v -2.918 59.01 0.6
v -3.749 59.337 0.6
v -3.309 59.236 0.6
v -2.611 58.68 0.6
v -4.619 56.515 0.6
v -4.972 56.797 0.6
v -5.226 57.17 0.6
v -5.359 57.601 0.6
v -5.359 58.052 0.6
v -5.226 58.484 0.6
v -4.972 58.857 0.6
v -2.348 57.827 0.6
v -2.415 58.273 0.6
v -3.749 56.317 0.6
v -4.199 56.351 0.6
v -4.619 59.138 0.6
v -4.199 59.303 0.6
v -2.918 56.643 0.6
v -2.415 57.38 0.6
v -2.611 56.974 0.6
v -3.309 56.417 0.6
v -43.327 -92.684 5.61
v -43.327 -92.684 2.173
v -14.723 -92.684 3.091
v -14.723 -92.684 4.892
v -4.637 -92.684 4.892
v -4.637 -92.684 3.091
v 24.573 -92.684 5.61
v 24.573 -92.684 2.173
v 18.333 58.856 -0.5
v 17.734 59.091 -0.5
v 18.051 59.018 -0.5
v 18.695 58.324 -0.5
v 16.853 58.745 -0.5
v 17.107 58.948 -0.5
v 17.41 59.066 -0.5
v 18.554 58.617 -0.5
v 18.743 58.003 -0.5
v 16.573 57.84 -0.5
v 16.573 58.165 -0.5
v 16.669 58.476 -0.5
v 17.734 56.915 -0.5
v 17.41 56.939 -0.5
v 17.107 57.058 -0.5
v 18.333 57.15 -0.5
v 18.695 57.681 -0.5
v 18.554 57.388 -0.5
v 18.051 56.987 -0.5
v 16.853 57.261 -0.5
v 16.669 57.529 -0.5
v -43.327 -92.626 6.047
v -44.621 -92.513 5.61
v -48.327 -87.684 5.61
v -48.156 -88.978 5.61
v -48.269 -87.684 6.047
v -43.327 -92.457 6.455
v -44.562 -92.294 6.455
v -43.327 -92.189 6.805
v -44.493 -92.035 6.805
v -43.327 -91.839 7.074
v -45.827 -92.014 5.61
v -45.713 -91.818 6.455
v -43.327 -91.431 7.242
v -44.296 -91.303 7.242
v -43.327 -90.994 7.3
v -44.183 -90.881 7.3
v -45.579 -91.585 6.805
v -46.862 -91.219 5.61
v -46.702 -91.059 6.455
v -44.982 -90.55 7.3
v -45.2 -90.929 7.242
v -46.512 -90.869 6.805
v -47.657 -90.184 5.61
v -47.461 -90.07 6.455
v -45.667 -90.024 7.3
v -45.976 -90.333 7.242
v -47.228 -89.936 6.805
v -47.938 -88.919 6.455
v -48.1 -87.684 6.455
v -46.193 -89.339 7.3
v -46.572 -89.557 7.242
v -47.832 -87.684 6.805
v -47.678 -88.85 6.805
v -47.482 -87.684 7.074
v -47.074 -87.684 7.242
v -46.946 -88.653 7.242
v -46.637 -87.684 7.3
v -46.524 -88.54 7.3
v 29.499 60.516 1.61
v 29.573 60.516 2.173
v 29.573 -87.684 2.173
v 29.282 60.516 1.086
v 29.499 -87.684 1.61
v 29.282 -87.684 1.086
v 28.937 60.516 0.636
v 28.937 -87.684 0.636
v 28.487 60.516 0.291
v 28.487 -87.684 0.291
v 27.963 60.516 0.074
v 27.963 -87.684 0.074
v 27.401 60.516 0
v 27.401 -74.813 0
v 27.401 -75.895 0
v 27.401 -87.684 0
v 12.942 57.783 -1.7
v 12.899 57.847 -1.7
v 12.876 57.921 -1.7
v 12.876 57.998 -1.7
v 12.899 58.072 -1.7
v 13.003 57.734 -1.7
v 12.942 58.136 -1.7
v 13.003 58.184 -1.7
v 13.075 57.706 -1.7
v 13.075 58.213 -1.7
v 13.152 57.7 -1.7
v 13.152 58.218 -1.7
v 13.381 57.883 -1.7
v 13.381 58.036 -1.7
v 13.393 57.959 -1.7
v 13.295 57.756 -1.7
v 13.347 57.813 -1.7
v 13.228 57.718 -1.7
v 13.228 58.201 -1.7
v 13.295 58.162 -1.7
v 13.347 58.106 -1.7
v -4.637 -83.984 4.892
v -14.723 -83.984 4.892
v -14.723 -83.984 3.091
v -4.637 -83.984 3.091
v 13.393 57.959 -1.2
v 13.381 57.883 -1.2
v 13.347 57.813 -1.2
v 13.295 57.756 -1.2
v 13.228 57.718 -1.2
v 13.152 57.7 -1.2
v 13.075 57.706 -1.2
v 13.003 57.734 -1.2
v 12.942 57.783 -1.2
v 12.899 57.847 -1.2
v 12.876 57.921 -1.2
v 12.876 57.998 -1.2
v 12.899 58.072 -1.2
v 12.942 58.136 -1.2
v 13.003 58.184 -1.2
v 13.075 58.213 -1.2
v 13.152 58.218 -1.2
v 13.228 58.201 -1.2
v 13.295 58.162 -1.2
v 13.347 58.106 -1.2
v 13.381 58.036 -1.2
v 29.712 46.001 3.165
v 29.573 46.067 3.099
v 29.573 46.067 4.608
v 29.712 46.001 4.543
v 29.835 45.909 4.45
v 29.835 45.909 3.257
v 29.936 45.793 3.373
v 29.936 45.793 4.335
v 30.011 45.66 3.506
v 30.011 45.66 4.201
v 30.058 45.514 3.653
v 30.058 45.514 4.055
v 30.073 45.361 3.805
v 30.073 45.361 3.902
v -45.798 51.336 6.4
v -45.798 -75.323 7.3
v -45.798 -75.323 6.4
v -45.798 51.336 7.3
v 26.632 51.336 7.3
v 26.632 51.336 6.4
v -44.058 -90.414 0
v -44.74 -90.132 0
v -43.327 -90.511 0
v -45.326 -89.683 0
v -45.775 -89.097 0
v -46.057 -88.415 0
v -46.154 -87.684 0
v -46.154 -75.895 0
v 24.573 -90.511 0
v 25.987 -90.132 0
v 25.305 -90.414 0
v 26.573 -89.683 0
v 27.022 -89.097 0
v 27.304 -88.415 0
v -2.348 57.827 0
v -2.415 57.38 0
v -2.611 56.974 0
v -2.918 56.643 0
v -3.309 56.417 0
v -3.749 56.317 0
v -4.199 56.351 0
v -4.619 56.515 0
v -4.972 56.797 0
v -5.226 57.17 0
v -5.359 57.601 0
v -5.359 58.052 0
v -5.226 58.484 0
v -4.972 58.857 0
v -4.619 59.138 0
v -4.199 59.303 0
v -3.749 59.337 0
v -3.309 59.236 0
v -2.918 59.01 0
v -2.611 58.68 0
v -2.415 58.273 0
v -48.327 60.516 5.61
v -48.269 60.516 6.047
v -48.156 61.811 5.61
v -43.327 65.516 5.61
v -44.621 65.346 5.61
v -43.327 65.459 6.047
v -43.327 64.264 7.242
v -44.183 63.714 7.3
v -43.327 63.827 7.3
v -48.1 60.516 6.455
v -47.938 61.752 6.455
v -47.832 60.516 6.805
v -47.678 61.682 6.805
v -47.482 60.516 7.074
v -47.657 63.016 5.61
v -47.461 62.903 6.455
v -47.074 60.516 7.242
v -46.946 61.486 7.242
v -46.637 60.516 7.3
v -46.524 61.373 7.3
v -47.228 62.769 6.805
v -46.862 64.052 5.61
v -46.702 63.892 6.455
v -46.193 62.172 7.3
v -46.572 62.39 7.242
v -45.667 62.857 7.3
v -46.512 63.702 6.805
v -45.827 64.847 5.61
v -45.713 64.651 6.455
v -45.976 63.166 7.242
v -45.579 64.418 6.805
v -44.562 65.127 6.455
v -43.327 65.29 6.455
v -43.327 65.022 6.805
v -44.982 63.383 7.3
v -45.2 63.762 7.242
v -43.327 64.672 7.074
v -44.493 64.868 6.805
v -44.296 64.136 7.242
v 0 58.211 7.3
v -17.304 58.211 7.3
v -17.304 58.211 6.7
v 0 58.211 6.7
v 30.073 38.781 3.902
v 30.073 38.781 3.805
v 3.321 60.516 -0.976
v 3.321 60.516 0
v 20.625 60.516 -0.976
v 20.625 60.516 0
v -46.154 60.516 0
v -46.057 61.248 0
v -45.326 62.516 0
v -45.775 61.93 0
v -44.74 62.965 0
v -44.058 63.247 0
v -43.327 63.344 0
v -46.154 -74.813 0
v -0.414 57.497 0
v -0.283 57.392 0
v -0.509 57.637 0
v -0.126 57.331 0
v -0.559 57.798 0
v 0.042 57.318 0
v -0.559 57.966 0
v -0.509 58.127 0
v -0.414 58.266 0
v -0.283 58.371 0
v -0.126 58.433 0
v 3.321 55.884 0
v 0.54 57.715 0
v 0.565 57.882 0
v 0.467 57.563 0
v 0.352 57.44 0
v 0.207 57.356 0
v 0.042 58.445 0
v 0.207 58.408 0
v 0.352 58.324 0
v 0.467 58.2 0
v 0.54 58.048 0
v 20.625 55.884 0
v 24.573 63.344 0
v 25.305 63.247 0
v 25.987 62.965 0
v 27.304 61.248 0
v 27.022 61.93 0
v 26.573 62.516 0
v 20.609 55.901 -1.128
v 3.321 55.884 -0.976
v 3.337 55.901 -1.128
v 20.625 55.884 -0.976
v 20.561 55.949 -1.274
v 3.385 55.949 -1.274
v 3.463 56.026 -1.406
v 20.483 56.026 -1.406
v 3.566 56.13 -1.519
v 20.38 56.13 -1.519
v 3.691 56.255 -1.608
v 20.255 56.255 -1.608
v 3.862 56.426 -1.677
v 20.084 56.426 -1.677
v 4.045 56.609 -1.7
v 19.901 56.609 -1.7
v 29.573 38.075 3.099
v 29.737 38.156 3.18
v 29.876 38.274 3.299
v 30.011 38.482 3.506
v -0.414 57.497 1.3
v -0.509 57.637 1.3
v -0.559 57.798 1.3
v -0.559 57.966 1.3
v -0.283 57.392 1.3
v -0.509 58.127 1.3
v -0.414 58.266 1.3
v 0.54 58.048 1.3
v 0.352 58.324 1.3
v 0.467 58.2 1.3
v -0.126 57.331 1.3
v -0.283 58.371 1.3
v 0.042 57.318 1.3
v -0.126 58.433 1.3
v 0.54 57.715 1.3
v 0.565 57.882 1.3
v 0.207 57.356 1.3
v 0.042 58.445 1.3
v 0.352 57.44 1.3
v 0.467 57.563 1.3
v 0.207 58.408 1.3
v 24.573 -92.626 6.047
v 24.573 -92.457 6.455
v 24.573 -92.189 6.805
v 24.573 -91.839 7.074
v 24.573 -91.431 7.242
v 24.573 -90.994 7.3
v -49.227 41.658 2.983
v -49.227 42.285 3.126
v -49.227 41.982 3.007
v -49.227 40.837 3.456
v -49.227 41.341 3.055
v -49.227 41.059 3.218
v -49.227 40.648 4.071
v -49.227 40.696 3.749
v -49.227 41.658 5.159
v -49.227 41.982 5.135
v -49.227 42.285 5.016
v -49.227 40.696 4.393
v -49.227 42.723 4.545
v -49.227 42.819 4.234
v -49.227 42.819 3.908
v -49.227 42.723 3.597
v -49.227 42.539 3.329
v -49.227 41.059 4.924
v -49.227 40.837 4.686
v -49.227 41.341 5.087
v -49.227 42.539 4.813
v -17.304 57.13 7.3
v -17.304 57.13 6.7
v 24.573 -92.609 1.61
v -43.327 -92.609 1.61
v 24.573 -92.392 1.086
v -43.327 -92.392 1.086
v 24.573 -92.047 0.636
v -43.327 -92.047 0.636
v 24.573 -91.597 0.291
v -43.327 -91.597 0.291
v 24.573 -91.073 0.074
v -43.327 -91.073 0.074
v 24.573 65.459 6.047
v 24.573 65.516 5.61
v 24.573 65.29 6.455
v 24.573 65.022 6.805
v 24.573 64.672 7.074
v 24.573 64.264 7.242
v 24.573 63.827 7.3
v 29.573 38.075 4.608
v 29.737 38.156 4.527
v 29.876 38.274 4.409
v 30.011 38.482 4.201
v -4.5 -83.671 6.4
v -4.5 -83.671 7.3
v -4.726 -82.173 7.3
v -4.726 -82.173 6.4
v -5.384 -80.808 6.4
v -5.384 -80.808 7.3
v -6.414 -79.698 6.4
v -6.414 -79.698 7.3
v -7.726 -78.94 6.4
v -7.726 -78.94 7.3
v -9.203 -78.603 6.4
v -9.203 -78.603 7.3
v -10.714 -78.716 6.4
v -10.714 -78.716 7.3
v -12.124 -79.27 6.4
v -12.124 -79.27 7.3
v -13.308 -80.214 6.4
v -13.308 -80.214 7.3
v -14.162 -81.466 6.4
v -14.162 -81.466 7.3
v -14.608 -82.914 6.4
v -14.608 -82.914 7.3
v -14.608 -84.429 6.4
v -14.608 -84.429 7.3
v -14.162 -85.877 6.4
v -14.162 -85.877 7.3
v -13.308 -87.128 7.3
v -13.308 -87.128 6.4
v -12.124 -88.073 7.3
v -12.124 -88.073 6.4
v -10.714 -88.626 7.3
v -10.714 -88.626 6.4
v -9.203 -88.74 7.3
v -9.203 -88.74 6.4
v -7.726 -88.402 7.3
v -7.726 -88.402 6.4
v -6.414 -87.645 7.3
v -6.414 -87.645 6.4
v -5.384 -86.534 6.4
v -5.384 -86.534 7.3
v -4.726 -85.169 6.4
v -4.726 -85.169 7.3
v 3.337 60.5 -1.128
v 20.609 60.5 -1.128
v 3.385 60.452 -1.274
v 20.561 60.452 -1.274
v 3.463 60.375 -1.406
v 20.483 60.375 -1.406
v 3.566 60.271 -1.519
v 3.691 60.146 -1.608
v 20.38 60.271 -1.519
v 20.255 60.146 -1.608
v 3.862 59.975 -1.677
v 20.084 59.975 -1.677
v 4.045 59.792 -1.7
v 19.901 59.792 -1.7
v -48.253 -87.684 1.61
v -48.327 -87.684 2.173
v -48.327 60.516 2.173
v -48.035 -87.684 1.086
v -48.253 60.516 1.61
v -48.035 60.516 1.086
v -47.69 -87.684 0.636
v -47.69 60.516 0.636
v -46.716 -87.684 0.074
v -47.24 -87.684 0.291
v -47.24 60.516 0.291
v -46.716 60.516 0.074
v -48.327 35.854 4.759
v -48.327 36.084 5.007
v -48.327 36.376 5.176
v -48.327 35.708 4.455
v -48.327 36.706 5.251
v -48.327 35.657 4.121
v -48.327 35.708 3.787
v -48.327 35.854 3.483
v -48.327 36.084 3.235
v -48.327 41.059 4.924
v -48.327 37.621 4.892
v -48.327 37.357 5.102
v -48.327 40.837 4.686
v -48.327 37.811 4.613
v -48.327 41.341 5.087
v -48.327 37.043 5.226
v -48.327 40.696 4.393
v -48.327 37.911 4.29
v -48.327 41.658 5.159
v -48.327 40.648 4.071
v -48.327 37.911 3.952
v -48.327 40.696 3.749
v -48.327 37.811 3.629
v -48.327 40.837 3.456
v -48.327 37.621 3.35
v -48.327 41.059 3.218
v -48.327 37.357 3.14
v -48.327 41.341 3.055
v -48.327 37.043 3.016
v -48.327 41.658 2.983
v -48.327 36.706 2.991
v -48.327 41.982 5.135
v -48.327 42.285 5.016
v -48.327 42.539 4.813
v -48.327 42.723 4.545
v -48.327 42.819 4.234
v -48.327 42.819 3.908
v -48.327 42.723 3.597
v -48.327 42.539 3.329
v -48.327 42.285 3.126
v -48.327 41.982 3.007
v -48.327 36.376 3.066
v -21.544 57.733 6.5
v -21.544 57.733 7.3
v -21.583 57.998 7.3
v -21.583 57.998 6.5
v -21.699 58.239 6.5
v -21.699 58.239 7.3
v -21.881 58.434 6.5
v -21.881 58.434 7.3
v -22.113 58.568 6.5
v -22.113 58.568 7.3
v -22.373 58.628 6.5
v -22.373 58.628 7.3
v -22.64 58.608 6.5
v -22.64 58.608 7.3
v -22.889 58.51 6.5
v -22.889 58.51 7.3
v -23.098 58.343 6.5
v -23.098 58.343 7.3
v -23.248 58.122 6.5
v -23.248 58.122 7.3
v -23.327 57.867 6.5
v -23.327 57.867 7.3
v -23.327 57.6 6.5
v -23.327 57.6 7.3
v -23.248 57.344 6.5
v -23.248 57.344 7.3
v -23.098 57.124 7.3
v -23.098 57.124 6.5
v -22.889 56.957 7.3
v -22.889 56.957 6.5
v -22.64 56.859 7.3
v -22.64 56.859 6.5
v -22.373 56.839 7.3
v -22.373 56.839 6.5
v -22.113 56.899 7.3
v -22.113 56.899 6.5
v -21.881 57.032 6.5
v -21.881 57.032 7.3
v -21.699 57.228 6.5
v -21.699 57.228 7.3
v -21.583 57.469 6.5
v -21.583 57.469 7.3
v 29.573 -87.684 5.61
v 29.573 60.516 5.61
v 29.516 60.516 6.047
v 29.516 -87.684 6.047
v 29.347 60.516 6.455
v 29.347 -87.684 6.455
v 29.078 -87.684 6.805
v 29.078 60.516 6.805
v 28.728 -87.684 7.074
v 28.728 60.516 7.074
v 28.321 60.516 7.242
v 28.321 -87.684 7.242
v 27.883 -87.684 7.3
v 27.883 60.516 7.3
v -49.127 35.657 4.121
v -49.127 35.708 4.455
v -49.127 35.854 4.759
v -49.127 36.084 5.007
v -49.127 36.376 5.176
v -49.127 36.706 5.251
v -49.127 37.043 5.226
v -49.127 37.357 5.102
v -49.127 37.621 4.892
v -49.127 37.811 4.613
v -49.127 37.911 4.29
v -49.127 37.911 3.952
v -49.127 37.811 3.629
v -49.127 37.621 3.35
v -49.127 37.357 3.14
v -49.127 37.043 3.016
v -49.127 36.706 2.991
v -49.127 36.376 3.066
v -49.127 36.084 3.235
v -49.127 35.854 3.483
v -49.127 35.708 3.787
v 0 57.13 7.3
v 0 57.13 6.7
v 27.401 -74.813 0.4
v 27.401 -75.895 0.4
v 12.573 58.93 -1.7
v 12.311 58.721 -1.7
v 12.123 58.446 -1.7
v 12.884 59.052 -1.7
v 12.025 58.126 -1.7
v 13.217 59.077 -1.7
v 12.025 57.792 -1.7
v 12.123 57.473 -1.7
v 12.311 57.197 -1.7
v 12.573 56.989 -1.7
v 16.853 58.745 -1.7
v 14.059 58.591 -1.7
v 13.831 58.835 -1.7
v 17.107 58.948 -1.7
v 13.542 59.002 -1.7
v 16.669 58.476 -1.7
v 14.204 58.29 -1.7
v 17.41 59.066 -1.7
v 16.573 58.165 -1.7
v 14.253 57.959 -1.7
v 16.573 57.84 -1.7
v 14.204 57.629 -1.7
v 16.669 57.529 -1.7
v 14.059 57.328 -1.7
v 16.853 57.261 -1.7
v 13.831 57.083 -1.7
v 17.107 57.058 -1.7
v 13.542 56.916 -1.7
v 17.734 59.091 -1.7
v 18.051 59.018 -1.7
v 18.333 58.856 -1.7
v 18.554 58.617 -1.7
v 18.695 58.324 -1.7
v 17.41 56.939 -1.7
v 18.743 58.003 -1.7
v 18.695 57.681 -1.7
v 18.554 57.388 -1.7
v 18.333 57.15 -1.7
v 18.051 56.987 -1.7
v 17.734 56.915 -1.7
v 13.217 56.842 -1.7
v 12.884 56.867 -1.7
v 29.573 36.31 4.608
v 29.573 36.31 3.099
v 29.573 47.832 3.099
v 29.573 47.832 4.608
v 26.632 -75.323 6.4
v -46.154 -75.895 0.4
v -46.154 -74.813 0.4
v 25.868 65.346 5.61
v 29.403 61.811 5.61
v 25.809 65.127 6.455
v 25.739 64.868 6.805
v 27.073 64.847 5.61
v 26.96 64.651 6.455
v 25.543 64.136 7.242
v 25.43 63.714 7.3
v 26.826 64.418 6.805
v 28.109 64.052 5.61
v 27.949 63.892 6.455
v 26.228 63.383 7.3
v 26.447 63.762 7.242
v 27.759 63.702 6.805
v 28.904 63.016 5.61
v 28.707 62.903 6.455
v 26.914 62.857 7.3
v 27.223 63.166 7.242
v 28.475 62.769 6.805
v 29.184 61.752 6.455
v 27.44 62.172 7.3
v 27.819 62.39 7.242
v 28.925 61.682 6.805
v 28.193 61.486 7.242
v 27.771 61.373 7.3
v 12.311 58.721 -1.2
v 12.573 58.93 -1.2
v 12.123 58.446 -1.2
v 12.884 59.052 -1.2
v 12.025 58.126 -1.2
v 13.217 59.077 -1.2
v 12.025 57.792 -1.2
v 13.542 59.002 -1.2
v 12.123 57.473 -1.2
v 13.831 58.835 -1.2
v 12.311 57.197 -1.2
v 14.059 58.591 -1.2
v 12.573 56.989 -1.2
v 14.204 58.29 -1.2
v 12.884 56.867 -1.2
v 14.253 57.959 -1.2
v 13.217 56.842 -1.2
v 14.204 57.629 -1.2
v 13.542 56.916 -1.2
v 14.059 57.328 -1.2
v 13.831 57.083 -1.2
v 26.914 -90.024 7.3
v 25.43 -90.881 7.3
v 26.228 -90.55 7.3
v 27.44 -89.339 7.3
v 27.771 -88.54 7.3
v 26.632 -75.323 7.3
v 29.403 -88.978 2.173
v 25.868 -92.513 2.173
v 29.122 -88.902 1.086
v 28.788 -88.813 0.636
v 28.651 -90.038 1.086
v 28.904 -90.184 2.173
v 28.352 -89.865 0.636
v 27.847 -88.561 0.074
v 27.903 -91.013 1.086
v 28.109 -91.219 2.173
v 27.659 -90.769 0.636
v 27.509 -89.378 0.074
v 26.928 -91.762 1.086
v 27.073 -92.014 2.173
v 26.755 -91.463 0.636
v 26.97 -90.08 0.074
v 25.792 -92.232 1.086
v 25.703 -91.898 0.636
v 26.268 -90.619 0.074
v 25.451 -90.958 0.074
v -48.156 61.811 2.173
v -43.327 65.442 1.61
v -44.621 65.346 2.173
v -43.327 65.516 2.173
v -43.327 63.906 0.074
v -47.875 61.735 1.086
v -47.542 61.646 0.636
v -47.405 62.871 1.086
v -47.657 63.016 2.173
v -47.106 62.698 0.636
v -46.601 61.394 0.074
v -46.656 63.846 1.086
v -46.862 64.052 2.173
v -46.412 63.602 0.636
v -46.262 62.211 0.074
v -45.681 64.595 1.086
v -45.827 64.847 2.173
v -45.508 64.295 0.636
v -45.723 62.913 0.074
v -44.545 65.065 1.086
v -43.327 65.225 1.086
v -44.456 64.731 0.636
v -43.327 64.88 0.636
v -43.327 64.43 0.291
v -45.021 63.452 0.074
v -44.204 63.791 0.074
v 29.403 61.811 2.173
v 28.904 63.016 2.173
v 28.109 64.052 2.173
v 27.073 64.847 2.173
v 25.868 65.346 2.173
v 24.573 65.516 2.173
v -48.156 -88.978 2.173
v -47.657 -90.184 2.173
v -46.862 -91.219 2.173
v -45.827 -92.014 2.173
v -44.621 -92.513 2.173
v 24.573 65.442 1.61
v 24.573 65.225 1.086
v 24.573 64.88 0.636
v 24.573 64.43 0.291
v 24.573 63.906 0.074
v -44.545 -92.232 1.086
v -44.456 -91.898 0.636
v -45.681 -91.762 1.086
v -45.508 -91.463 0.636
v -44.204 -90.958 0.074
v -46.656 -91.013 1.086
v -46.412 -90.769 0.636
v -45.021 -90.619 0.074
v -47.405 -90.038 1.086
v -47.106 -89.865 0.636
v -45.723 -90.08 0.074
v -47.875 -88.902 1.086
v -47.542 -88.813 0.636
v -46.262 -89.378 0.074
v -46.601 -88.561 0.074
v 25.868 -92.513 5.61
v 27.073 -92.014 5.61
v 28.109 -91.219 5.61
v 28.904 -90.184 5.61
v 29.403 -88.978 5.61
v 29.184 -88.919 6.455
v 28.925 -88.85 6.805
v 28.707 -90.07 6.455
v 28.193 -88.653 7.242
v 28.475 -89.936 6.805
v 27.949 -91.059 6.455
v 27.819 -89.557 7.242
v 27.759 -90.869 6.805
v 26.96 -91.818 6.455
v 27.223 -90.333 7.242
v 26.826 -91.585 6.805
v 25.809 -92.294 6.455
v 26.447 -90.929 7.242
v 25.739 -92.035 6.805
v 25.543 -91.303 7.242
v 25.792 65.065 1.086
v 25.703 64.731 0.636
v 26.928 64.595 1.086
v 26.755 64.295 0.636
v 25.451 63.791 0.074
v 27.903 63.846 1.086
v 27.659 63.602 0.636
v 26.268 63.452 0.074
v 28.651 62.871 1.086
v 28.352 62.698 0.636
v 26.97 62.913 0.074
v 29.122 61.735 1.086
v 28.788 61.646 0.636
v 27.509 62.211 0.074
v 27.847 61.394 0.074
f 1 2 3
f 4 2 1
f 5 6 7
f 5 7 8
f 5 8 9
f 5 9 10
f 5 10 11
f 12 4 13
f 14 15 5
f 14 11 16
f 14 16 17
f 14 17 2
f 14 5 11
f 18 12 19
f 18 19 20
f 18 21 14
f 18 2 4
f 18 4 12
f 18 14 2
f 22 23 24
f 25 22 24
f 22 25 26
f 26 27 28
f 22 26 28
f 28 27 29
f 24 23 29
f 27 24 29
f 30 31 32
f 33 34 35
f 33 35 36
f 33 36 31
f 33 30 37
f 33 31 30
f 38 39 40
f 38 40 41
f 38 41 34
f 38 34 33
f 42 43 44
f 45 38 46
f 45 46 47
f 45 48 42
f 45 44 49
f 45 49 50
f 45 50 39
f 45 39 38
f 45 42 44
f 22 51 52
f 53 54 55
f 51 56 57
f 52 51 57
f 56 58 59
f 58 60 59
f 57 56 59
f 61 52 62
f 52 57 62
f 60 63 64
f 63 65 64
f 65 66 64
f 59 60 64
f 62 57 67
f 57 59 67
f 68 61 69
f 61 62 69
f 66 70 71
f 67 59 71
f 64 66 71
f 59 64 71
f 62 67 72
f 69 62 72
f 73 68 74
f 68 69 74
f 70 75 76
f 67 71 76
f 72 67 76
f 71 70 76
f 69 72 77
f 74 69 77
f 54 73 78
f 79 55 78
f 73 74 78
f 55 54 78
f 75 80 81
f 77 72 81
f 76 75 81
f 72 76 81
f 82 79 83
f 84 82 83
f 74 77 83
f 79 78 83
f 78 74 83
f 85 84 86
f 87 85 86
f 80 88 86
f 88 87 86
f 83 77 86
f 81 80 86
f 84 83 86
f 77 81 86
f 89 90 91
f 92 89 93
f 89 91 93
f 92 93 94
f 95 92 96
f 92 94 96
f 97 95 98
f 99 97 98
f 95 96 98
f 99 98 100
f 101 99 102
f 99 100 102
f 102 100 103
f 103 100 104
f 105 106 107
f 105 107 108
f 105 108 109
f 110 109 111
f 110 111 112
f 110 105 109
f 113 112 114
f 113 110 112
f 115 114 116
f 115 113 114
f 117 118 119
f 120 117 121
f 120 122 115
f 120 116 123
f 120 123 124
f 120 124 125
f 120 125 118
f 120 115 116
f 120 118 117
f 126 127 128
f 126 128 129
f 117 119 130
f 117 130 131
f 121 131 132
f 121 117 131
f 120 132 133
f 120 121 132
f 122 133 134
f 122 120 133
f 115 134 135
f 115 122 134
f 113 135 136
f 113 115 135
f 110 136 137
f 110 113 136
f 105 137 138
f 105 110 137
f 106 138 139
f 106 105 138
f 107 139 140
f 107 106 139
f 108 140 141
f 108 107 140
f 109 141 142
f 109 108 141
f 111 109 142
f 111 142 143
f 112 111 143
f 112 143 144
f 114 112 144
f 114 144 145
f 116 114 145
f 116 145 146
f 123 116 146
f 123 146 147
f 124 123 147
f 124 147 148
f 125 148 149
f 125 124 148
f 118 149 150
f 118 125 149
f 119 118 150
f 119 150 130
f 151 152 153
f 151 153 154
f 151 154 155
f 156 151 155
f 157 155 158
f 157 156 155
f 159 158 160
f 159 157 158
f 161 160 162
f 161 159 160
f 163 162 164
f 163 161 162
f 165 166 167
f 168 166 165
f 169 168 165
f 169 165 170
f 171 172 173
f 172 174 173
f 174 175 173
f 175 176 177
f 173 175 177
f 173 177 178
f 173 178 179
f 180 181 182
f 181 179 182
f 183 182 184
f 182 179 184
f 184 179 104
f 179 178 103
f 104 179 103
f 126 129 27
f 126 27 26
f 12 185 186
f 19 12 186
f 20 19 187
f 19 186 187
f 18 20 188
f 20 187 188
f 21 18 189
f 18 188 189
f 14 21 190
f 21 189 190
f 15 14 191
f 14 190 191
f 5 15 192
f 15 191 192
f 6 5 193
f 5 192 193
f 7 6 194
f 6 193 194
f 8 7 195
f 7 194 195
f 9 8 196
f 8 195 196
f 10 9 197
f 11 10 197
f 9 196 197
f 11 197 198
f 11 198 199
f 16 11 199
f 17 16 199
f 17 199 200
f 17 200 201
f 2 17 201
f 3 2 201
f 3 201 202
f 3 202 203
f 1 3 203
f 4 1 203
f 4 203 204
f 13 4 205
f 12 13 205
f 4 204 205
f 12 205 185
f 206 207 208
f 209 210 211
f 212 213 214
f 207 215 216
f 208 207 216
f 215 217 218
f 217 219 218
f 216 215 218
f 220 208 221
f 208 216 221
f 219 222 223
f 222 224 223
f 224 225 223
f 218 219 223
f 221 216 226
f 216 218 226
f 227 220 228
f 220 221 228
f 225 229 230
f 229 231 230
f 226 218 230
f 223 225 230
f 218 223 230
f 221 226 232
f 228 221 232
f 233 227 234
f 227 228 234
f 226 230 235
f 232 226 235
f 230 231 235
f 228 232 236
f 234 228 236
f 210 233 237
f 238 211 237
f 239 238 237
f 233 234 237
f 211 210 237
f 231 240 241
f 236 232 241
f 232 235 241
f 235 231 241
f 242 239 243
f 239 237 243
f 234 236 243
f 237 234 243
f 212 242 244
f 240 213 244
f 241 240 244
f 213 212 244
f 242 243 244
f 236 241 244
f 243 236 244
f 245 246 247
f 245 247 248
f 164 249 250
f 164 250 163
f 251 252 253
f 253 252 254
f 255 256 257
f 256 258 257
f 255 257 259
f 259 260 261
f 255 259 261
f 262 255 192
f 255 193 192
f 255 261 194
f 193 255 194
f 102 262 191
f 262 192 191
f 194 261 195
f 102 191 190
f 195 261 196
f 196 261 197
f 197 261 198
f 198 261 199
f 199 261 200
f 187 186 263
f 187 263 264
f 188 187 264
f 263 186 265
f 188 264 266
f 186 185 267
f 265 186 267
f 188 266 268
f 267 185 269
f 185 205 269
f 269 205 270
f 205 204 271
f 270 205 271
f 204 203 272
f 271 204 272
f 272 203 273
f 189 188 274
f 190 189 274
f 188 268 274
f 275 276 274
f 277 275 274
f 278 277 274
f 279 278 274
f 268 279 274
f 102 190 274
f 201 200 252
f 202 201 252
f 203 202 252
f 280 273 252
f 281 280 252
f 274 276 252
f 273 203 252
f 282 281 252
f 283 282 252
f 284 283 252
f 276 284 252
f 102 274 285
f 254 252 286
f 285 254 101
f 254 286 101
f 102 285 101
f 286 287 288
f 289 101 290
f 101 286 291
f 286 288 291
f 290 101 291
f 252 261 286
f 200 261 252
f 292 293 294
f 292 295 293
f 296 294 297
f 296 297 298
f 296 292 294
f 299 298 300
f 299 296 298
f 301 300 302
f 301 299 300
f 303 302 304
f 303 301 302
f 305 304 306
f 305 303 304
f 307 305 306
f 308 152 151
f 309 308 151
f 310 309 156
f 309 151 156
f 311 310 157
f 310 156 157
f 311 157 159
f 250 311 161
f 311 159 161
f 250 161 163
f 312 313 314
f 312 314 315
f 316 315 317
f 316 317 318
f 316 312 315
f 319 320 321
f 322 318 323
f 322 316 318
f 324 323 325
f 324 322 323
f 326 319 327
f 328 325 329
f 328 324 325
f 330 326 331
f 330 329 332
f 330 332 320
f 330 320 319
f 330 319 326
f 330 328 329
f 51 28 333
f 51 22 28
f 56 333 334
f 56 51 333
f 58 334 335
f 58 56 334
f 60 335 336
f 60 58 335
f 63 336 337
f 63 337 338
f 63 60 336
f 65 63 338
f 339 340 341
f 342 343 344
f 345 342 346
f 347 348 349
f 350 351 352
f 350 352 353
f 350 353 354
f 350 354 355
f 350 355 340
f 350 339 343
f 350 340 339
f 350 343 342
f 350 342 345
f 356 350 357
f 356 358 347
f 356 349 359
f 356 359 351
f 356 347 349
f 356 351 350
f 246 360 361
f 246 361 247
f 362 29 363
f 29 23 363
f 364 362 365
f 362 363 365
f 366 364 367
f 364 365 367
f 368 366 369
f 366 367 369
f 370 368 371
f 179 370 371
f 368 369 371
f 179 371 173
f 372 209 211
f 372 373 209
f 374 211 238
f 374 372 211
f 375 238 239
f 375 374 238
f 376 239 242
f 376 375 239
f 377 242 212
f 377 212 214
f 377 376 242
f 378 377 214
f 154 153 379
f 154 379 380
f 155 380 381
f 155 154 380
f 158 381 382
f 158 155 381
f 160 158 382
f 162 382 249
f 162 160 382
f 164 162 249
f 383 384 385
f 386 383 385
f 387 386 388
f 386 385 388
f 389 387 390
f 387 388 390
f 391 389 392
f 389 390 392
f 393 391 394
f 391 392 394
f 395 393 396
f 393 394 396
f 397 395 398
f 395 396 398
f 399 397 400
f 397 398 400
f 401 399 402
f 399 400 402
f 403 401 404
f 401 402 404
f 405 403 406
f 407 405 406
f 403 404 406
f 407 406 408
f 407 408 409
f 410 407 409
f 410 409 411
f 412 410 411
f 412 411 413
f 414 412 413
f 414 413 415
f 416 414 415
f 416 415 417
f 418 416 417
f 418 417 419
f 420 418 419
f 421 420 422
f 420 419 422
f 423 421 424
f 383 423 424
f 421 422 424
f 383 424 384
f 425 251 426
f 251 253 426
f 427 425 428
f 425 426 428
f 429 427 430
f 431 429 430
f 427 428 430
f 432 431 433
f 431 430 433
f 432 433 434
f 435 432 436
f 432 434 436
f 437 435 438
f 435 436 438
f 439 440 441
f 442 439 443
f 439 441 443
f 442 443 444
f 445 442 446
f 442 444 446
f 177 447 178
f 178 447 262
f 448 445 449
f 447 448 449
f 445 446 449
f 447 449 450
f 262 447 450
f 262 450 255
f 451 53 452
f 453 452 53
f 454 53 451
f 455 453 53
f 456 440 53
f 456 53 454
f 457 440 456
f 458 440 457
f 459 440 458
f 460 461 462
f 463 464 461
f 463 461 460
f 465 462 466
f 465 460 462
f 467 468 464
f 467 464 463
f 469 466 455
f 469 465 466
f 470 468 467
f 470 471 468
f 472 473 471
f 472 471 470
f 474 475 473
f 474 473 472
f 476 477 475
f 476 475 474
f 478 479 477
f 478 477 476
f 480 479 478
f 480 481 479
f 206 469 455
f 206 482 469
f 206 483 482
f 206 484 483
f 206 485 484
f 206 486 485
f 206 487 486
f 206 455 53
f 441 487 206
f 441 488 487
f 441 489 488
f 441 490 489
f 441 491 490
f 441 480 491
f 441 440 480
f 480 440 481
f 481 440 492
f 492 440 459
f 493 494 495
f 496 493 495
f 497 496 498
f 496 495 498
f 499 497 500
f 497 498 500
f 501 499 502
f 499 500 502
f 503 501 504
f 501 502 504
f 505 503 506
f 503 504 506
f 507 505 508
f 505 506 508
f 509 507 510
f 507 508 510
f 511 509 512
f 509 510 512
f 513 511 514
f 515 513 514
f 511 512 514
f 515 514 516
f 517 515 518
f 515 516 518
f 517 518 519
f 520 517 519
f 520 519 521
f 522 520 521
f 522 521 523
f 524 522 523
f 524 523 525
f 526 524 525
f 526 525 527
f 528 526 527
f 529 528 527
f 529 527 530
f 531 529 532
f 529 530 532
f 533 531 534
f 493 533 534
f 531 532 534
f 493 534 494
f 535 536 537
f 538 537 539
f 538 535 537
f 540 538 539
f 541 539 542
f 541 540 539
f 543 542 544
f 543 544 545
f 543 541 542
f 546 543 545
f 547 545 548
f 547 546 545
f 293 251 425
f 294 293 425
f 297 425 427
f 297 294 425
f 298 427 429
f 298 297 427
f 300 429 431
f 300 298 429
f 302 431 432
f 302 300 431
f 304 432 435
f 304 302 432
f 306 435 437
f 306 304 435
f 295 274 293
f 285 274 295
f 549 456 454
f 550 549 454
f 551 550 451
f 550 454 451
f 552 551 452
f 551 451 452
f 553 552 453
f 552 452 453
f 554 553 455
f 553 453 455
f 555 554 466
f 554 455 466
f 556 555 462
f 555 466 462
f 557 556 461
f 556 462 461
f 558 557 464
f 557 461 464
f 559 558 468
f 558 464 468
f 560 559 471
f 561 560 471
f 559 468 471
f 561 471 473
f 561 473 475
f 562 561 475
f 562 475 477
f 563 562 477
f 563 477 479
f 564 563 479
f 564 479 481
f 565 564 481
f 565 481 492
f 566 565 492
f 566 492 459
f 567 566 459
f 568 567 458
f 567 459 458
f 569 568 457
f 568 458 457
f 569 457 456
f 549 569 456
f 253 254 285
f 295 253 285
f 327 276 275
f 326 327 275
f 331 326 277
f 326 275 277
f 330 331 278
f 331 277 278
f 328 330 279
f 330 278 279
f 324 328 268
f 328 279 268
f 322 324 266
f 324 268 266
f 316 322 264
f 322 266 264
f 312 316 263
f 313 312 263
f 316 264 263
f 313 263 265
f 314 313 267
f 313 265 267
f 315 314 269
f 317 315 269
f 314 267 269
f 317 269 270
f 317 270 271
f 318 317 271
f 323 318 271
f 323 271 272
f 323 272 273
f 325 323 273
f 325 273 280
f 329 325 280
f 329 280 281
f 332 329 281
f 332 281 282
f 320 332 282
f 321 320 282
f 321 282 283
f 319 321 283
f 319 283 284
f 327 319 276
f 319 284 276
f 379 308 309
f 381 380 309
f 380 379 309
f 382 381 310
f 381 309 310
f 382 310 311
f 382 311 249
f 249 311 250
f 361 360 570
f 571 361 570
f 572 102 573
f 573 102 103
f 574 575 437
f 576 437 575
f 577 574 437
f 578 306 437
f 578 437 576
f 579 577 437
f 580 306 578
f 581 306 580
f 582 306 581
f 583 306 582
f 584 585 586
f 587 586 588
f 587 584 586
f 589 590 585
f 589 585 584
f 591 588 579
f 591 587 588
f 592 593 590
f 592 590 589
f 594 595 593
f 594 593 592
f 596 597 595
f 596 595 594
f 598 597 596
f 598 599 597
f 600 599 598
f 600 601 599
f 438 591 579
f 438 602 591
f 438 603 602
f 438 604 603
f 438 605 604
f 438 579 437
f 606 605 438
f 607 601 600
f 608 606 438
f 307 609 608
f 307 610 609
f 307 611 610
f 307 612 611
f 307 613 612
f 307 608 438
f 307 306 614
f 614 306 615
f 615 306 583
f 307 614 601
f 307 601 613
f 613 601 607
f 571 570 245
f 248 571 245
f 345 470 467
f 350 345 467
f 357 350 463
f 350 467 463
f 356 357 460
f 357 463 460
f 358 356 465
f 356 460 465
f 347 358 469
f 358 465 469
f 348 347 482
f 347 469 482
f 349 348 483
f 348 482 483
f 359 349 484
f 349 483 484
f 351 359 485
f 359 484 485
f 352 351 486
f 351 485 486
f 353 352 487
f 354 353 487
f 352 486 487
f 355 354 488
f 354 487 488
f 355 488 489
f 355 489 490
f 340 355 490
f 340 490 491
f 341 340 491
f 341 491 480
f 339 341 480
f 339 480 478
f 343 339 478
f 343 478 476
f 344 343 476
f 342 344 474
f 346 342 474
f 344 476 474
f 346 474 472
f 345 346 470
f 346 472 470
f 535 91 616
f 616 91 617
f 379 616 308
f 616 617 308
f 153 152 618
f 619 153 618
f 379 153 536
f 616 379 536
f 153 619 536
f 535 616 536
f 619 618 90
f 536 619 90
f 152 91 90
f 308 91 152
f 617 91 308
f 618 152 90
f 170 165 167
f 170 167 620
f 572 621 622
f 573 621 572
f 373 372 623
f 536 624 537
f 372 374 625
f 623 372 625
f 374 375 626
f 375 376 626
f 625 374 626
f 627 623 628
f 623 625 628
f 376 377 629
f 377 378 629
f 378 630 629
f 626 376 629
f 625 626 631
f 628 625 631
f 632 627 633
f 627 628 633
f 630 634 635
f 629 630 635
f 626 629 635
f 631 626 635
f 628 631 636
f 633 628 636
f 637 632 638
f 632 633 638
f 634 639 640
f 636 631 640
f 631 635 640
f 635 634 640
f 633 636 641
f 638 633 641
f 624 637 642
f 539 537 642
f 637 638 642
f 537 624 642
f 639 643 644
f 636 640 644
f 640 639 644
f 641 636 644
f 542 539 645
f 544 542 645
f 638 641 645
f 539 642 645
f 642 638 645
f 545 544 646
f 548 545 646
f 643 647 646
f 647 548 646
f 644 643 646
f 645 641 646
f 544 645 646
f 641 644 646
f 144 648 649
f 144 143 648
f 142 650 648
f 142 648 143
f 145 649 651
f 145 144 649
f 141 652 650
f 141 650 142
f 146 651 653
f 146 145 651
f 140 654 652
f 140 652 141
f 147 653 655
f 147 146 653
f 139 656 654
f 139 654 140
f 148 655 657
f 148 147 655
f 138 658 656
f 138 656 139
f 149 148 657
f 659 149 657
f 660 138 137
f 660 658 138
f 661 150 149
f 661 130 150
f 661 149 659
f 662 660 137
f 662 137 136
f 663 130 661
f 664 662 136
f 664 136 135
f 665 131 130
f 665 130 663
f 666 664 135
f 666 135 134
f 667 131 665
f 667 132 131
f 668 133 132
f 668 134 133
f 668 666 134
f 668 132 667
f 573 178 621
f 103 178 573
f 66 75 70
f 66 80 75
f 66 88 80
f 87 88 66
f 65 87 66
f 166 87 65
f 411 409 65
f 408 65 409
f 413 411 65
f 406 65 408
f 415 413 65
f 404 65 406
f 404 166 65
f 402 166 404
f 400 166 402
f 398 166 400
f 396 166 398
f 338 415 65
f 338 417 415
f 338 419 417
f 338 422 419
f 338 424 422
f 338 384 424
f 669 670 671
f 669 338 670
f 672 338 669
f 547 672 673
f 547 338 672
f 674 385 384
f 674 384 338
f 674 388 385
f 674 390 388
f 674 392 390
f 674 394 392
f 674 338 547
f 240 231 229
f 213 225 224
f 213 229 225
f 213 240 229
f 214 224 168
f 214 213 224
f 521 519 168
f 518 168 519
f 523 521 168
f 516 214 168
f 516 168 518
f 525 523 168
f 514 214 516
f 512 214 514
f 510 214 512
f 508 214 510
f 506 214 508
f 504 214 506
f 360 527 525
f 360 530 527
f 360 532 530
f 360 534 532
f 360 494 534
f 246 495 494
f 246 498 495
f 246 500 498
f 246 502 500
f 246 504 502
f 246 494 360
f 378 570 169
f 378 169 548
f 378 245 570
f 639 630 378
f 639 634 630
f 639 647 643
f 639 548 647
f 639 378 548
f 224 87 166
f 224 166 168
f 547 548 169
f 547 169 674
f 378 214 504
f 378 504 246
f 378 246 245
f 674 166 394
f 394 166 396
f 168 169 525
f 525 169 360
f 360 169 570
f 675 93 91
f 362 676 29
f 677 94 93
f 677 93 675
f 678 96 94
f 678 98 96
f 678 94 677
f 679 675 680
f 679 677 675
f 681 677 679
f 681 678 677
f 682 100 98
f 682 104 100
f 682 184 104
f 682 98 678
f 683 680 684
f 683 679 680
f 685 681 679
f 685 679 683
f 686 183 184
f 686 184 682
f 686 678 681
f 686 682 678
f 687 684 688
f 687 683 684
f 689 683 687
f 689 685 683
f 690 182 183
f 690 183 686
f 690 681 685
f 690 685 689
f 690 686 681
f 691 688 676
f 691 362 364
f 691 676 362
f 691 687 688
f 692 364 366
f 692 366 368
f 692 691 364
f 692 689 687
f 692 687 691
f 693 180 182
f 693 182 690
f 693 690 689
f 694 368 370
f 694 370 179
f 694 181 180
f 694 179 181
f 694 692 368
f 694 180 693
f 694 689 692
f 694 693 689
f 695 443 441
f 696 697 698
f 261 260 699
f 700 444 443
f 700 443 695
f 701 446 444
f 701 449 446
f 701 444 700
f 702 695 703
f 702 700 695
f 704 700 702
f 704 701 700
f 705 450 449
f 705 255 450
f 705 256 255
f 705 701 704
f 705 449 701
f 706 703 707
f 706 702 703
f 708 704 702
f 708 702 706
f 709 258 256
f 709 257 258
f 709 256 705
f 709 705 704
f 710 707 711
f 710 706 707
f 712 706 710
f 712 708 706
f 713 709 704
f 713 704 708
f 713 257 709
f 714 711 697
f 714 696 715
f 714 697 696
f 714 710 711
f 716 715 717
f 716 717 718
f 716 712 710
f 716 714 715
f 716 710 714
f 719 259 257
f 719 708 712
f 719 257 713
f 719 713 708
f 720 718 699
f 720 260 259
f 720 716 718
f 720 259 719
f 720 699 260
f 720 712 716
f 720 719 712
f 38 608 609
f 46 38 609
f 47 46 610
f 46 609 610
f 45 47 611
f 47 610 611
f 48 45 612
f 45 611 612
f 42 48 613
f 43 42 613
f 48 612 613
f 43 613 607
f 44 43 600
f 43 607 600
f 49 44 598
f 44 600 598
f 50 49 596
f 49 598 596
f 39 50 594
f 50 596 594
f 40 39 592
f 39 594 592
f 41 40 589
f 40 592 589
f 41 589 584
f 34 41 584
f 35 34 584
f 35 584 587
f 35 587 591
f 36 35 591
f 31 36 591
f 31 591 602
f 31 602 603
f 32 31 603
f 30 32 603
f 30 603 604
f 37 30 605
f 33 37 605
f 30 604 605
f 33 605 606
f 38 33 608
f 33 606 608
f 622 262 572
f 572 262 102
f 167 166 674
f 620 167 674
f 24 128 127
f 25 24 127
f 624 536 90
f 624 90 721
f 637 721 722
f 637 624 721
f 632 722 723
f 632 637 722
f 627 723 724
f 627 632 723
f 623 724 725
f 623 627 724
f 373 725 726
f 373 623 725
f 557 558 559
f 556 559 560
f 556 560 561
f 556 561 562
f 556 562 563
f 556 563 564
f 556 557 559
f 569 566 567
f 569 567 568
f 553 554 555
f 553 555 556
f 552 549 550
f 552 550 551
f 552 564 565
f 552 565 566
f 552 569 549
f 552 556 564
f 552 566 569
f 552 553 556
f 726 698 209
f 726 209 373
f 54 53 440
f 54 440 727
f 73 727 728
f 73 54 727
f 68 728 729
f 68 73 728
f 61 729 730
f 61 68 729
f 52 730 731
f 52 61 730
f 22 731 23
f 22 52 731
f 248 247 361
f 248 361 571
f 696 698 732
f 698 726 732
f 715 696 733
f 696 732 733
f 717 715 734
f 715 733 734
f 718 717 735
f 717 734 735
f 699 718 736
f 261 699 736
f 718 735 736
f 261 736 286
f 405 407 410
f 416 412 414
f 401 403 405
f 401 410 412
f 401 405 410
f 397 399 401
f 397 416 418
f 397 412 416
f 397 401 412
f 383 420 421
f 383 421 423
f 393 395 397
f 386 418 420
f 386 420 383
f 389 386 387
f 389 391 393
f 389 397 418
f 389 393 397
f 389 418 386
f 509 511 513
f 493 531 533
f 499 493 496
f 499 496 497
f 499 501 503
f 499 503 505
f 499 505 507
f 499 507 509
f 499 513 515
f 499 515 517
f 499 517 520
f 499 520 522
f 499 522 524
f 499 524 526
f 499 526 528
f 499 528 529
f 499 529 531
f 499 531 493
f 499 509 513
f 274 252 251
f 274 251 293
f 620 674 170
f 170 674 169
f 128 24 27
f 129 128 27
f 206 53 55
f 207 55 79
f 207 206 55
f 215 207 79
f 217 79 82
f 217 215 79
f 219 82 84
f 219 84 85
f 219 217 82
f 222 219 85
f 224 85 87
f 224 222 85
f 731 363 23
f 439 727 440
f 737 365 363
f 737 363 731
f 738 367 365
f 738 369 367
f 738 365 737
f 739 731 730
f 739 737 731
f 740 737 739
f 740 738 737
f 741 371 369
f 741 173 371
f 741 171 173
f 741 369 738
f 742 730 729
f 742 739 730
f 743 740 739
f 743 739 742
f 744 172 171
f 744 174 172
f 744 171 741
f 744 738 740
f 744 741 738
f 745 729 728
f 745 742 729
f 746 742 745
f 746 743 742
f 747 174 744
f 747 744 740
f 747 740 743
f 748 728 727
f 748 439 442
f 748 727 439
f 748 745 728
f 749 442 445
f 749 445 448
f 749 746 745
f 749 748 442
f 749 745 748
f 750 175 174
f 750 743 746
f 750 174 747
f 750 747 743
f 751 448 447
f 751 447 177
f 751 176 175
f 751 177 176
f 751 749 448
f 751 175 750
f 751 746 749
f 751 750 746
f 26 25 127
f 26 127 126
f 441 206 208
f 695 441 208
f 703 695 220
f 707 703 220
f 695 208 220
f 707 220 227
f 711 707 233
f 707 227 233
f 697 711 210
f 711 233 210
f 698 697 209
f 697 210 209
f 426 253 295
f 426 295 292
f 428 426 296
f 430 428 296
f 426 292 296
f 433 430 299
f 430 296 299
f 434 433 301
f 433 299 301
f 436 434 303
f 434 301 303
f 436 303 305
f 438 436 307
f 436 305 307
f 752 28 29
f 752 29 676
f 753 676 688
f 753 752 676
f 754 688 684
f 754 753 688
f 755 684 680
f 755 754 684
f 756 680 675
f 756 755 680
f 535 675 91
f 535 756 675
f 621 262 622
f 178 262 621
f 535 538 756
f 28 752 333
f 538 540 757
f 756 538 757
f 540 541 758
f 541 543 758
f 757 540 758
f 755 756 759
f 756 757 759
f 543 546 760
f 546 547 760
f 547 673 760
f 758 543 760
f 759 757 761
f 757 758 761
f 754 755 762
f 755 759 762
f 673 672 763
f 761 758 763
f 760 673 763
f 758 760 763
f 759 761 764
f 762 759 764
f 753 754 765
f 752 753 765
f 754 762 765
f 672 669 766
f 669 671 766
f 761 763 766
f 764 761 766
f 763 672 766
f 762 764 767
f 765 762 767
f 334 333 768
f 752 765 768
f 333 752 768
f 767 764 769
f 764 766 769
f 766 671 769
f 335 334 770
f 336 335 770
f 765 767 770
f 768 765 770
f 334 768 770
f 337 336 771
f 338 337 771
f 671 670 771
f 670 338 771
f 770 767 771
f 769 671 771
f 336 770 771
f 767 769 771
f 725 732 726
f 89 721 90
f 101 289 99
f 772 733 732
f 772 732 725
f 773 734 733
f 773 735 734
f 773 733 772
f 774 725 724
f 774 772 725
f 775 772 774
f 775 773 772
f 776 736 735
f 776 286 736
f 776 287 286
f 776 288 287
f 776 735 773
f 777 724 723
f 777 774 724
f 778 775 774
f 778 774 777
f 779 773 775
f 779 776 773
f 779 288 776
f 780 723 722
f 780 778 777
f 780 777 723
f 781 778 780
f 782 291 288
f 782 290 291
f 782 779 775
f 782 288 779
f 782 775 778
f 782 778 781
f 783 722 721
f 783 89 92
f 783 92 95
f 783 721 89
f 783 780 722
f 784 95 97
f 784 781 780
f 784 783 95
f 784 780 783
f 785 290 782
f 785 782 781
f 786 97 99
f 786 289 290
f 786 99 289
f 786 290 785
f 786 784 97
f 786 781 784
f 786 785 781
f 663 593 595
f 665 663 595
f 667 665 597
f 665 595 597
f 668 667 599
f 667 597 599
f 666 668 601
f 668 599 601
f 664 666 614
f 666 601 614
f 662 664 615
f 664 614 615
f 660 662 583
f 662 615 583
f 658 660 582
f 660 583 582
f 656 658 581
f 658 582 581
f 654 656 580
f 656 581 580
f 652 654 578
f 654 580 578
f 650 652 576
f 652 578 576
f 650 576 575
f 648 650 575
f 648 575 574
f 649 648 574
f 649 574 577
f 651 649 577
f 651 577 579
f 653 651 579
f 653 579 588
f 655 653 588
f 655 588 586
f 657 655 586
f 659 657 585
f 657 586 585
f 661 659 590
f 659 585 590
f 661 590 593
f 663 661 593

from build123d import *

# Parameters (mm, degrees)
F0_W         = 77.9
F0_H         = 158.2
F1_DEPTH     = 7.3
F2_R         = 5
F3_R         = 1.6899494937
F4_R         = 2.1727922061
F5_W         = 72.4303945899
F5_H         = 126.6588754952
F6_DEPTH     = 0.9
F7_R         = 5.0823894813
F8_DEPTH     = 0.9
F9_W         = 17.3039510846
F9_H         = 1.0814964771
F10_DEPTH    = 0.6
F11_R        = 0.8966339166
F12_DEPTH    = 0.8
F13_W        = 17.3039520159
F13_H        = 4.6321238935
F14_DEPTH    = 1.7
F15_R        = 0.7242640687
F16_R        = 1.0910584654
F17_DEPTH    = 1.2
F18_R        = 1.1204591048
F18_R_2      = 0.2597799208
F19_DEPTH    = 0.5
F20_R        = 0.5652467708
F21_DEPTH    = 1.3
F22_R        = 1.5140930758
F23_DEPTH    = 0.6
F24_W        = 10.0857308134
F24_H        = 1.8002798315
F25_DEPTH    = 8.7
F26_W        = 7.992297411
F26_H        = 1.5090261586
F27_DEPTH    = 0.5
F28_T1_DEPTH = 5.0389206483
F28_T3_DEPTH = 11.5221919007
F29_R        = 1.0914541248
F30_DEPTH    = 0.9
F31_R        = 1.1331057204
F32_DEPTH    = 0.8
F33_W        = 73.5544155877
F33_H        = 1.0814964771
F34_DEPTH    = 0.4


# Not quite as in the source:
# - a fillet or chamfer that OpenCascade refuses, or shapes differently, is made with other operations: its cross-section is extruded or revolved along the edge and cut away or added


with BuildPart() as f1:
    # F0 (on Top) → F1 (new body)
    with BuildSketch(Plane.XY):
        with Locations((-9.3765874773, -13.58352229)):
            Rectangle(F0_W, F0_H)
    extrude(amount=F1_DEPTH)

    # F2
    f2_edges = [f1.edges().sort_by_distance(p)[0] for p in [
        (-48.326587, -92.683522, 3.65),
        (29.573413, -92.683522, 3.65),
        (29.573413, 65.516478, 3.65),
        (-48.326587, 65.516478, 3.65),
    ]]
    fillet(f2_edges, radius=F2_R)

    # F3
    f3_edges = [f1.edges().sort_by_distance(p)[0] for p in [
        (-48.326587, -13.583522, 7.3),
        (-9.376587, 65.516478, 7.3),
        (28.108946, 64.052012, 7.3),
        (-46.862121, 64.052012, 7.3),
        (29.573413, -13.583522, 7.3),
        (28.108946, -91.219056, 7.3),
        (-46.862121, -91.219056, 7.3),
        (-9.376587, -92.683522, 7.3),
    ]]
    fillet(f3_edges, radius=F3_R)

    # F4
    f4_edges = [f1.edges().sort_by_distance(p)[0] for p in [
        (-48.326587, -13.583522, 0),
        (-9.376587, 65.516478, 0),
        (28.108946, 64.052012, 0),
        (-46.862121, 64.052012, 0),
        (29.573413, -13.583522, 0),
        (28.108946, -91.219056, 0),
        (-46.862121, -91.219056, 0),
        (-9.376587, -92.683522, 0),
    ]]
    fillet(f4_edges, radius=F4_R)

    # F5 (on face) → F6 (cut)
    with BuildSketch(Plane.XY.offset(7.3)):
        with Locations((-9.5828361809, -11.9932051748)):
            Rectangle(F5_W, F5_H)
    extrude(amount=-F6_DEPTH, mode=Mode.SUBTRACT)

    # F7 (on face) → F8 (cut)
    with BuildSketch(Plane.XY.offset(7.3)):
        with Locations((-9.5828361809, -83.671361208)):
            Circle(F7_R)
    extrude(amount=-F8_DEPTH, mode=Mode.SUBTRACT)

    # F9 (on face) → F10 (cut)
    with BuildSketch(Plane.XY.offset(7.3)):
        with Locations((-8.6519755423, 57.6703026891)):
            Rectangle(F9_W, F9_H)
    extrude(amount=-F10_DEPTH, mode=Mode.SUBTRACT)

    # F11 (on face) → F12 (cut)
    with BuildSketch(Plane.XY.offset(7.3)):
        with Locations((-22.4402733147, 57.7334612608)):
            Circle(F11_R)
    extrude(amount=-F12_DEPTH, mode=Mode.SUBTRACT)

    # F13 (on face) → F14 (join)
    with BuildSketch(Plane(origin=(0, 0, 0), x_dir=(1, 0, 0), z_dir=(0, 0, -1))):
        with Locations((11.9729838334, -58.2004157633)):
            Rectangle(F13_W, F13_H)
    extrude(amount=F14_DEPTH)

    # F15
    f15_edges = [f1.edges().sort_by_distance(p)[0] for p in [
        (11.972984, 60.516478, -1.7),
        (11.972984, 55.884354, -1.7),
        (20.62496, 58.200416, -1.7),
        (3.321008, 58.200416, -1.7),
    ]]
    fillet(f15_edges, radius=F15_R)

    # F16 (on face) → F17 (cut)
    with BuildSketch(Plane(origin=(0, 0, -1.7), x_dir=(1, 0, 0), z_dir=(0, 0, -1))):
        with Locations((17.652342096, -58.0027028918)):
            Circle(F16_R)
    extrude(amount=-F17_DEPTH, mode=Mode.SUBTRACT)

    # F18 (on face) → F19 (cut)
    with BuildSketch(Plane(origin=(0, 0, -1.7), x_dir=(1, 0, 0), z_dir=(0, 0, -1))):
        with Locations((13.1328506395, -57.9593703151)):
            Circle(F18_R)
        with Locations((13.1328506395, -57.9593703151)):
            Circle(F18_R_2, mode=Mode.SUBTRACT)
    extrude(amount=-F19_DEPTH, mode=Mode.SUBTRACT)

    # F20 (on face) → F21 (cut)
    with BuildSketch(Plane(origin=(0, 0, 0), x_dir=(1, 0, 0), z_dir=(0, 0, -1))):
        with Locations((0, -57.881783694)):
            Circle(F20_R)
    extrude(amount=-F21_DEPTH, mode=Mode.SUBTRACT)

    # F22 (on face) → F23 (cut)
    with BuildSketch(Plane(origin=(0, 0, 0), x_dir=(1, 0, 0), z_dir=(0, 0, -1))):
        with Locations((-3.8621318527, -57.8266605735)):
            Circle(F22_R)
    extrude(amount=-F23_DEPTH, mode=Mode.SUBTRACT)

    # F24 (on face) → F25 (cut)
    with BuildSketch(Plane.XZ.offset(92.68352229)):
        with Locations((-9.6801561303, 3.9914349327)):
            Rectangle(F24_W, F24_H)
    extrude(amount=-F25_DEPTH, mode=Mode.SUBTRACT)

    # F26 (on face) → F27 (join)
    with BuildSketch(Plane.YZ.offset(29.5734125227)):
        with Locations((42.0706942677, 3.8539019879)):
            Rectangle(F26_W, F26_H)
    extrude(amount=F27_DEPTH)

    # F28: fillet of radius 0.7484062043 on 4 edges, made by hand

    # F28_s2 → F28_t1 (cut)
    with BuildSketch(Plane.XY.offset(1.3344416637)):
        with BuildLine():
            ThreePointArc((29.5734125227, 46.0668429732), (29.9357520066, 45.7934164433), (30.0734125227, 45.3608640753))
            Line((30.0734125227, 45.3608640753), (30.0734125227, 46.0668429732))
            Line((30.0734125227, 46.0668429732), (29.5734125227, 46.0668429732))
        make_face()
        with BuildLine():
            ThreePointArc((29.5734125227, 38.0745455623), (29.9357520066, 38.3479720922), (30.0734125227, 38.7805244602))
            Line((30.0734125227, 38.7805244602), (30.0734125227, 38.0745455623))
            Line((30.0734125227, 38.0745455623), (29.5734125227, 38.0745455623))
        make_face()
    extrude(amount=F28_T1_DEPTH, mode=Mode.SUBTRACT)

    # F28_s4 → F28_t3 (cut)
    with BuildSketch(Plane.XZ.offset(-47.8317902181)):
        with BuildLine():
            ThreePointArc((29.5734125227, 4.6084150672), (29.9357520066, 4.3349885373), (30.0734125227, 3.9024361693))
            Line((30.0734125227, 3.9024361693), (30.0734125227, 4.6084150672))
            Line((30.0734125227, 4.6084150672), (29.5734125227, 4.6084150672))
        make_face()
        with BuildLine():
            ThreePointArc((29.5734125227, 3.0993889086), (29.9357520066, 3.3728154385), (30.0734125227, 3.8053678065))
            Line((30.0734125227, 3.8053678065), (30.0734125227, 3.0993889086))
            Line((30.0734125227, 3.0993889086), (29.5734125227, 3.0993889086))
        make_face()
    extrude(amount=F28_T3_DEPTH, mode=Mode.SUBTRACT)

    # F29 (on face) → F30 (join)
    with BuildSketch(Plane(origin=(-48.3265874773, 0, 0), x_dir=(0, -1, 0), z_dir=(-1, 0, 0))):
        with Locations((-41.7392961681, 4.070978146)):
            Circle(F29_R)
    extrude(amount=F30_DEPTH)

    # F31 (on face) → F32 (join)
    with BuildSketch(Plane(origin=(-48.3265874773, 0, 0), x_dir=(0, -1, 0), z_dir=(-1, 0, 0))):
        with Locations((-36.7904044688, 4.1209622286)):
            Circle(F31_R)
    extrude(amount=F32_DEPTH)

    # F33 (on face) → F34 (cut)
    with BuildSketch(Plane(origin=(0, 0, 0), x_dir=(1, 0, 0), z_dir=(0, 0, -1))):
        with Locations((-9.3765874773, 75.3538236022)):
            Rectangle(F33_W, F33_H)
    extrude(amount=-F34_DEPTH, mode=Mode.SUBTRACT)


solid = f1.part
